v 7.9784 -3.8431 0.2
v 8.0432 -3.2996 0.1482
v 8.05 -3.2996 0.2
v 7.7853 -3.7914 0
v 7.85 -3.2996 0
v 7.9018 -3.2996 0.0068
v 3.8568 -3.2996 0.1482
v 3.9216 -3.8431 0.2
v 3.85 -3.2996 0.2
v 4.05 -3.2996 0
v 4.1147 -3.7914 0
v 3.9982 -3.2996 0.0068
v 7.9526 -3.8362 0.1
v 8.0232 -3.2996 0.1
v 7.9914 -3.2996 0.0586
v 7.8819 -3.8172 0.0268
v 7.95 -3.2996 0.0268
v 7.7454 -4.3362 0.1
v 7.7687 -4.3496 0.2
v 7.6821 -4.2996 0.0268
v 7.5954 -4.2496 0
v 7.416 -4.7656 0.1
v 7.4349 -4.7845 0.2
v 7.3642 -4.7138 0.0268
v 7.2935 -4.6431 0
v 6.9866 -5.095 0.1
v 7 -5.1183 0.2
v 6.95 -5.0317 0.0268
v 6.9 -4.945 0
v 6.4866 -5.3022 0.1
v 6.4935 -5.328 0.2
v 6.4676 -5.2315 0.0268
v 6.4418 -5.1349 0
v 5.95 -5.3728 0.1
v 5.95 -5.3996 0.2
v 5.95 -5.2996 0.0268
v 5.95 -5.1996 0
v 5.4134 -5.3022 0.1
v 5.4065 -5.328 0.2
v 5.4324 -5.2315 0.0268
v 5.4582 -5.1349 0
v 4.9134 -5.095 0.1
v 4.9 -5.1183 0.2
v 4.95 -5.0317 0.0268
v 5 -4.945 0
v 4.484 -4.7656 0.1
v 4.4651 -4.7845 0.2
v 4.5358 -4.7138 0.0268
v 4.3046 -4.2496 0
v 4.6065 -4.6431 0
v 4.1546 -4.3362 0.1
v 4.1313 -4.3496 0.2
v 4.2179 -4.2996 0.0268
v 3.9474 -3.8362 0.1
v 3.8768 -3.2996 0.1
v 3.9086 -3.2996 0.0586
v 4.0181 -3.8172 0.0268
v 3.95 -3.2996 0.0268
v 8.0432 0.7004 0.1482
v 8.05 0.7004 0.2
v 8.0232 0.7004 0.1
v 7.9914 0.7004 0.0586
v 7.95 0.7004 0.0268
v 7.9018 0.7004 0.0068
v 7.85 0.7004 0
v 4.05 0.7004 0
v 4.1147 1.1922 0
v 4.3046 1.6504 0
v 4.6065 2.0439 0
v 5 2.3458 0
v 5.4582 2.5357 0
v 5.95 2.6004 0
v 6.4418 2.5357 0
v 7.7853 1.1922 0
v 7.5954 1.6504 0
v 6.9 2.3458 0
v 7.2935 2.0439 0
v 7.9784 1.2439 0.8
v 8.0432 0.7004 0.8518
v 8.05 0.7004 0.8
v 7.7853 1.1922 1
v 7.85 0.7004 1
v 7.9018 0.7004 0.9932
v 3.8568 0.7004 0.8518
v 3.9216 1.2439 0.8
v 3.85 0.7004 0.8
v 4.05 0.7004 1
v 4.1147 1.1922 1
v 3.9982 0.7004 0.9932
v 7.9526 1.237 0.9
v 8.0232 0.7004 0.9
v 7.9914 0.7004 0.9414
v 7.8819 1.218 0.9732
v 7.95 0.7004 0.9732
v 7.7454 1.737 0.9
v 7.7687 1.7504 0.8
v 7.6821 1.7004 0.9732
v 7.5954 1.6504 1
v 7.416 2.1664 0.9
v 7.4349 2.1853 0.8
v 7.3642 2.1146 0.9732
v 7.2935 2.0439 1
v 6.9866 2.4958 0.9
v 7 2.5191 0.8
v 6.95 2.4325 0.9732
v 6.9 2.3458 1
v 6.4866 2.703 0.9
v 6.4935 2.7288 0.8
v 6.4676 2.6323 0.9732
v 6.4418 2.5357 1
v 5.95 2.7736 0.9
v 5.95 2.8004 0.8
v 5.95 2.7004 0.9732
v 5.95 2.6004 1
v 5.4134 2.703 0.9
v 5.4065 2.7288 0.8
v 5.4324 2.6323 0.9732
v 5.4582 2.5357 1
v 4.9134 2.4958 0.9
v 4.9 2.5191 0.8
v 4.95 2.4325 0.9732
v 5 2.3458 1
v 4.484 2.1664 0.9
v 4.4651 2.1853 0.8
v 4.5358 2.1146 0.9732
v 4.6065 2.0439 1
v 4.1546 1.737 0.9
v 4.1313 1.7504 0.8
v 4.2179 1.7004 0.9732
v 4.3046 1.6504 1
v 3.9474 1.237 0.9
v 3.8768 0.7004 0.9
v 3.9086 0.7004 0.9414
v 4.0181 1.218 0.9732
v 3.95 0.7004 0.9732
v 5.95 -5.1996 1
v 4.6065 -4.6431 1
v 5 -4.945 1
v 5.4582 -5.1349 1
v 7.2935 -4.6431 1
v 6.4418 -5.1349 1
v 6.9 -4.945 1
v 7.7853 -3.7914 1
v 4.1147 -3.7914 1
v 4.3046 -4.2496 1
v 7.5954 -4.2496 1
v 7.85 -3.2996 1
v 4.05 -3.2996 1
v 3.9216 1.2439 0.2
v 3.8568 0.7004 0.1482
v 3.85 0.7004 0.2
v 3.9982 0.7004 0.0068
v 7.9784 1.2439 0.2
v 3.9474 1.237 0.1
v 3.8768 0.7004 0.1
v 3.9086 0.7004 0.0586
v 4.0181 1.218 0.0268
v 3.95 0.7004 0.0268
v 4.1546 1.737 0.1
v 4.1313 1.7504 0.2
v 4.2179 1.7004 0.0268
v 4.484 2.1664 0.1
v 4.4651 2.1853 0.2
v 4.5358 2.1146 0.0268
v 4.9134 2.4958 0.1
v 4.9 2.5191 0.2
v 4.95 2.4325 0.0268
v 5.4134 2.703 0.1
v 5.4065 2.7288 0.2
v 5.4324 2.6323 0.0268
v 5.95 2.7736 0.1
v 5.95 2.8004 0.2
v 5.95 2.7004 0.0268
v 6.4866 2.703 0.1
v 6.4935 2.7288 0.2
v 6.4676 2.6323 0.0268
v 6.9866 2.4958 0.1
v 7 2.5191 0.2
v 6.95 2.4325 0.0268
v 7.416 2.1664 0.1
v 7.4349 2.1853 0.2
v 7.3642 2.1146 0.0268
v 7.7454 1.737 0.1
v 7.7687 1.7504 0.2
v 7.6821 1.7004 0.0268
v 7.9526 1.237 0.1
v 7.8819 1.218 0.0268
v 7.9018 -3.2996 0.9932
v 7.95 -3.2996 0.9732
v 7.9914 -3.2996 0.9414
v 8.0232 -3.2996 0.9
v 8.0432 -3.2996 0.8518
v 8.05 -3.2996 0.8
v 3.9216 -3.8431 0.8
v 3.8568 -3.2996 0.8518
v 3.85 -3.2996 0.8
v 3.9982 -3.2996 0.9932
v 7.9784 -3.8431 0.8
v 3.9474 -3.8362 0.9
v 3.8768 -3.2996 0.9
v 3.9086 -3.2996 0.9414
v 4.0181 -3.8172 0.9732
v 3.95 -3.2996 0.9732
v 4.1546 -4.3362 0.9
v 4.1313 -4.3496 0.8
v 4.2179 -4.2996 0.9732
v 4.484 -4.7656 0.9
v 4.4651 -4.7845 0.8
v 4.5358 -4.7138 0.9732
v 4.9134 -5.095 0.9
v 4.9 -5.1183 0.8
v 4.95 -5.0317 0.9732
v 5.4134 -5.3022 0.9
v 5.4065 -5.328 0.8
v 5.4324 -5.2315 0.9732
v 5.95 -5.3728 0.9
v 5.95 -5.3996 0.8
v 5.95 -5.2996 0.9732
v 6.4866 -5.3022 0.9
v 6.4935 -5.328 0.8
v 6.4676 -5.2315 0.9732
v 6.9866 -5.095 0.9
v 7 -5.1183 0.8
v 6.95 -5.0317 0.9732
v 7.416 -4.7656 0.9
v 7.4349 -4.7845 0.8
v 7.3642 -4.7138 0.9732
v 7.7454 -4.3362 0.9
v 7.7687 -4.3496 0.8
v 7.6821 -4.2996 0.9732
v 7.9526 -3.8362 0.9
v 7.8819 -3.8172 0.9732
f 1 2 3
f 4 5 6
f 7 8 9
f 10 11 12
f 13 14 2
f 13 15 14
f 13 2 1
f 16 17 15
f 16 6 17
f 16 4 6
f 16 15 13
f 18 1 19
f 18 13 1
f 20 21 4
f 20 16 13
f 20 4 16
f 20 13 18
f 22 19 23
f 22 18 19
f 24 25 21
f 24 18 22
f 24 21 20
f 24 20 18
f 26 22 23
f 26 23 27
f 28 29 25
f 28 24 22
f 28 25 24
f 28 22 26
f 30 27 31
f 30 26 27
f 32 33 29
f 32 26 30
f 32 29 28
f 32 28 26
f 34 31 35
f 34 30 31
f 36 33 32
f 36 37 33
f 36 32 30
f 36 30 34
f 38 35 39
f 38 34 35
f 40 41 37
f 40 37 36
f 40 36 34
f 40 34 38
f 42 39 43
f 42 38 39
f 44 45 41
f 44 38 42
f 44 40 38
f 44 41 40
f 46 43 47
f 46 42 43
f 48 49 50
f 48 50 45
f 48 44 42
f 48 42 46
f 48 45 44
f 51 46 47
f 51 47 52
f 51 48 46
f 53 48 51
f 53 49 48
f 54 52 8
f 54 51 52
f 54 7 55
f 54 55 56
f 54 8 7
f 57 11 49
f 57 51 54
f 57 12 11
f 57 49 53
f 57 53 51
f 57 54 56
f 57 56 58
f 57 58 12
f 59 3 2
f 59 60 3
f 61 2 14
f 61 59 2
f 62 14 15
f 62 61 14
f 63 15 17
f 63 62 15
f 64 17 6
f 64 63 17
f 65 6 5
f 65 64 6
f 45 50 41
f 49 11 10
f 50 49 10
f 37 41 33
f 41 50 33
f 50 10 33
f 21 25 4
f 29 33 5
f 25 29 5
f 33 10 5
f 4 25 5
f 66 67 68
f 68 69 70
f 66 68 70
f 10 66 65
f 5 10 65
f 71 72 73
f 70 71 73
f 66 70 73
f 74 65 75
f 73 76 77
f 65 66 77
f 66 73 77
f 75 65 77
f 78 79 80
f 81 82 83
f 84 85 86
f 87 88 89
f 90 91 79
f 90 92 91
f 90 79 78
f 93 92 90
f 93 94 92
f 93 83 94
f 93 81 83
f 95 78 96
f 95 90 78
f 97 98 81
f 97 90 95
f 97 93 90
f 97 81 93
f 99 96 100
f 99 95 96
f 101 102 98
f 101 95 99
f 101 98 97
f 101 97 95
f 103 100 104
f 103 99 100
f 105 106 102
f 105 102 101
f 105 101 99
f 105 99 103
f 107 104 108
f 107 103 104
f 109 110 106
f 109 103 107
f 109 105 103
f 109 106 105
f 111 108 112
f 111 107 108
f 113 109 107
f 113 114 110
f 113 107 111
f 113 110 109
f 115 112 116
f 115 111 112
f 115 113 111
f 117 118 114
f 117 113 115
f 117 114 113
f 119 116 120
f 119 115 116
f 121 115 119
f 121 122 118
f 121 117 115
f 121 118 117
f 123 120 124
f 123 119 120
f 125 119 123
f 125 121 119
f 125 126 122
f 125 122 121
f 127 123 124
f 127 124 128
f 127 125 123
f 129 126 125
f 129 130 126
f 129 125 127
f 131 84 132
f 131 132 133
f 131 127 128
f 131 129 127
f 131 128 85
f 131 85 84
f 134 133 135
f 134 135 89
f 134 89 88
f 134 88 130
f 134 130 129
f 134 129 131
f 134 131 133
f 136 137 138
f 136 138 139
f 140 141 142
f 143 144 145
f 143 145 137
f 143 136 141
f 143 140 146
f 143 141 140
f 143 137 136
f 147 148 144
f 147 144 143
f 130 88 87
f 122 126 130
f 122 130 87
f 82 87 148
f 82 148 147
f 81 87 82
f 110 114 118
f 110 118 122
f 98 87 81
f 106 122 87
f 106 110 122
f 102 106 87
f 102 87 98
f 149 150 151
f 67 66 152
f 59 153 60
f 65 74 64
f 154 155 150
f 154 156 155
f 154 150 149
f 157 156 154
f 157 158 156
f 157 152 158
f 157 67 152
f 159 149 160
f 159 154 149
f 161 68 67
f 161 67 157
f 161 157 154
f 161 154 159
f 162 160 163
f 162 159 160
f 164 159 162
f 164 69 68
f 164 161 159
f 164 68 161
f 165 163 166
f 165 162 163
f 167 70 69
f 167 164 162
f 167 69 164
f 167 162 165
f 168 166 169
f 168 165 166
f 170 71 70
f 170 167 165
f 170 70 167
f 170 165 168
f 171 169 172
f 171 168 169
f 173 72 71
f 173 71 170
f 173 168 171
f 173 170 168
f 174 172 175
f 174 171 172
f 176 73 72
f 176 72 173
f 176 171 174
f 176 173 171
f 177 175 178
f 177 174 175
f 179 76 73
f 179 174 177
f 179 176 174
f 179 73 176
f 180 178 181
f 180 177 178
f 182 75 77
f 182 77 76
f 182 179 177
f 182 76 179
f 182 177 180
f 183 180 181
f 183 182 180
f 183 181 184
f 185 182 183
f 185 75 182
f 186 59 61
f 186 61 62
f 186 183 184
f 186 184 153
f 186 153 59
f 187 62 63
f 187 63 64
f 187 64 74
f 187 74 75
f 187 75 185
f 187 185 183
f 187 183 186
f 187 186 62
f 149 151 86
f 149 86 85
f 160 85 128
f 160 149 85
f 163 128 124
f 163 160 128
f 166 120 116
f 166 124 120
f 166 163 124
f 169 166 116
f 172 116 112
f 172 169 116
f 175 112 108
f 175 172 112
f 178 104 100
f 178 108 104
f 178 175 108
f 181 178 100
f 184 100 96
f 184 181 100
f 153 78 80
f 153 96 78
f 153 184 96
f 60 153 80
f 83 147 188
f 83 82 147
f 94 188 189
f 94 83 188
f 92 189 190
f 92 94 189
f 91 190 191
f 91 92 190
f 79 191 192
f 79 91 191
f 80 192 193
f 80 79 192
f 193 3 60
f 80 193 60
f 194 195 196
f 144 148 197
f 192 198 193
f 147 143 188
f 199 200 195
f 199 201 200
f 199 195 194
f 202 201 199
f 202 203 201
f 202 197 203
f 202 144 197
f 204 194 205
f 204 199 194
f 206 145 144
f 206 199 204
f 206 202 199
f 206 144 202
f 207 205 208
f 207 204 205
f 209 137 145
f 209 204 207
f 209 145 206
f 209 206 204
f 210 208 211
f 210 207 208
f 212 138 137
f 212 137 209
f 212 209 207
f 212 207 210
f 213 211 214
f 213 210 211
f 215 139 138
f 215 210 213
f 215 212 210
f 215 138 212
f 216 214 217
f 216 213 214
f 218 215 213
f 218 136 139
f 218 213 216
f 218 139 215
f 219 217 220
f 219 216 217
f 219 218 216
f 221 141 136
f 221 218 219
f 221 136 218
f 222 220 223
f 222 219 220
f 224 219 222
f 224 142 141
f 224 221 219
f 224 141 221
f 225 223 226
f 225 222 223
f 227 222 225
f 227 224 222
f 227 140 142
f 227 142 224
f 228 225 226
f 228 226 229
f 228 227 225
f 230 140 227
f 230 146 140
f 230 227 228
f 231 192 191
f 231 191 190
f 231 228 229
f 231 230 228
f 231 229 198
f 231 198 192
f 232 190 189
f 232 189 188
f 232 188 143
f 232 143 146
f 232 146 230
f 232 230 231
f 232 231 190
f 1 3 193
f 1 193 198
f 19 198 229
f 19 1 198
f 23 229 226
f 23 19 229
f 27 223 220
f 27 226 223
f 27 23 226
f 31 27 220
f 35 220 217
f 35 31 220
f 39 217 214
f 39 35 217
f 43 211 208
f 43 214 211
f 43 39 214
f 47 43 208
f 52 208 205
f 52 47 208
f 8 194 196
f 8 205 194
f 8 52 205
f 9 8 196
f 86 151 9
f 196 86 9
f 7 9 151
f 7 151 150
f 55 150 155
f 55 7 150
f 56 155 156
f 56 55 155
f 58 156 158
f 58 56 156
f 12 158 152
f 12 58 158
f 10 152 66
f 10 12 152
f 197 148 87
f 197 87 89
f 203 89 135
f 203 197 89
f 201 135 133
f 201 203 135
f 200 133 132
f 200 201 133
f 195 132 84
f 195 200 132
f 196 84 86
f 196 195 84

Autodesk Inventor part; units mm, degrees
ref_plane "YZ Plane" through (0, 0, 0) normal (1, 0, 0) x (0, 1, 0)
ref_plane "XZ Plane" through (0, 0, 0) normal (0, 1, 0) x (-1, 0, 0)
ref_plane "XY Plane" through (0, 0, 0) normal (0, 0, 1) x (1, 0, 0)
sketch "Skizze1" plane through (0, 0, 0) normal (0, 0, 1) x (1, 0, 0)
  arc A0 (3.65, -3.2996) -> (8.25, -3.2996) centre (5.95, -3.2996) ccw projected
  line L0 (8.25, 0.7004) -> (8.25, -3.2996) projected
  arc A1 (8.25, 0.7004) -> (3.65, 0.7004) centre (5.95, 0.7004) ccw projected
  line L1 (3.65, -3.2996) -> (3.65, 0.7004) projected
  line L2 (5.95, -3.2996) -> (5.95, 0.7004) construction
  line L3 (8.05, -3.2996) -> (8.05, 0.7004)
  line L4 (3.85, 0.7004) -> (3.85, -3.2996)
  arc A2 (3.85, -3.2996) -> (8.05, -3.2996) centre (5.95, -3.2996) ccw
  arc A3 (8.05, 0.7004) -> (3.85, 0.7004) centre (5.95, 0.7004) ccw
  point P0 (0, 0)
  point P1 (5.95, -1.2996)
  dimension "d0" = 4.2
extrude "Extrusion1" add sketch "Skizze1" along normal blind 1 contours A2 L4 A3 L3
fillet "Rundung1" radius 0.2 8 edges at (5.95, 2.8004, 1) (3.85, -1.2996, 1) (5.95, -5.3996, 1) (8.05, -1.2996, 1) (5.95, 2.8004, 0) (3.85, -1.2996, 0) (5.95, -5.3996, 0) (8.05, -1.2996, 0)
properties part number "Feets"
